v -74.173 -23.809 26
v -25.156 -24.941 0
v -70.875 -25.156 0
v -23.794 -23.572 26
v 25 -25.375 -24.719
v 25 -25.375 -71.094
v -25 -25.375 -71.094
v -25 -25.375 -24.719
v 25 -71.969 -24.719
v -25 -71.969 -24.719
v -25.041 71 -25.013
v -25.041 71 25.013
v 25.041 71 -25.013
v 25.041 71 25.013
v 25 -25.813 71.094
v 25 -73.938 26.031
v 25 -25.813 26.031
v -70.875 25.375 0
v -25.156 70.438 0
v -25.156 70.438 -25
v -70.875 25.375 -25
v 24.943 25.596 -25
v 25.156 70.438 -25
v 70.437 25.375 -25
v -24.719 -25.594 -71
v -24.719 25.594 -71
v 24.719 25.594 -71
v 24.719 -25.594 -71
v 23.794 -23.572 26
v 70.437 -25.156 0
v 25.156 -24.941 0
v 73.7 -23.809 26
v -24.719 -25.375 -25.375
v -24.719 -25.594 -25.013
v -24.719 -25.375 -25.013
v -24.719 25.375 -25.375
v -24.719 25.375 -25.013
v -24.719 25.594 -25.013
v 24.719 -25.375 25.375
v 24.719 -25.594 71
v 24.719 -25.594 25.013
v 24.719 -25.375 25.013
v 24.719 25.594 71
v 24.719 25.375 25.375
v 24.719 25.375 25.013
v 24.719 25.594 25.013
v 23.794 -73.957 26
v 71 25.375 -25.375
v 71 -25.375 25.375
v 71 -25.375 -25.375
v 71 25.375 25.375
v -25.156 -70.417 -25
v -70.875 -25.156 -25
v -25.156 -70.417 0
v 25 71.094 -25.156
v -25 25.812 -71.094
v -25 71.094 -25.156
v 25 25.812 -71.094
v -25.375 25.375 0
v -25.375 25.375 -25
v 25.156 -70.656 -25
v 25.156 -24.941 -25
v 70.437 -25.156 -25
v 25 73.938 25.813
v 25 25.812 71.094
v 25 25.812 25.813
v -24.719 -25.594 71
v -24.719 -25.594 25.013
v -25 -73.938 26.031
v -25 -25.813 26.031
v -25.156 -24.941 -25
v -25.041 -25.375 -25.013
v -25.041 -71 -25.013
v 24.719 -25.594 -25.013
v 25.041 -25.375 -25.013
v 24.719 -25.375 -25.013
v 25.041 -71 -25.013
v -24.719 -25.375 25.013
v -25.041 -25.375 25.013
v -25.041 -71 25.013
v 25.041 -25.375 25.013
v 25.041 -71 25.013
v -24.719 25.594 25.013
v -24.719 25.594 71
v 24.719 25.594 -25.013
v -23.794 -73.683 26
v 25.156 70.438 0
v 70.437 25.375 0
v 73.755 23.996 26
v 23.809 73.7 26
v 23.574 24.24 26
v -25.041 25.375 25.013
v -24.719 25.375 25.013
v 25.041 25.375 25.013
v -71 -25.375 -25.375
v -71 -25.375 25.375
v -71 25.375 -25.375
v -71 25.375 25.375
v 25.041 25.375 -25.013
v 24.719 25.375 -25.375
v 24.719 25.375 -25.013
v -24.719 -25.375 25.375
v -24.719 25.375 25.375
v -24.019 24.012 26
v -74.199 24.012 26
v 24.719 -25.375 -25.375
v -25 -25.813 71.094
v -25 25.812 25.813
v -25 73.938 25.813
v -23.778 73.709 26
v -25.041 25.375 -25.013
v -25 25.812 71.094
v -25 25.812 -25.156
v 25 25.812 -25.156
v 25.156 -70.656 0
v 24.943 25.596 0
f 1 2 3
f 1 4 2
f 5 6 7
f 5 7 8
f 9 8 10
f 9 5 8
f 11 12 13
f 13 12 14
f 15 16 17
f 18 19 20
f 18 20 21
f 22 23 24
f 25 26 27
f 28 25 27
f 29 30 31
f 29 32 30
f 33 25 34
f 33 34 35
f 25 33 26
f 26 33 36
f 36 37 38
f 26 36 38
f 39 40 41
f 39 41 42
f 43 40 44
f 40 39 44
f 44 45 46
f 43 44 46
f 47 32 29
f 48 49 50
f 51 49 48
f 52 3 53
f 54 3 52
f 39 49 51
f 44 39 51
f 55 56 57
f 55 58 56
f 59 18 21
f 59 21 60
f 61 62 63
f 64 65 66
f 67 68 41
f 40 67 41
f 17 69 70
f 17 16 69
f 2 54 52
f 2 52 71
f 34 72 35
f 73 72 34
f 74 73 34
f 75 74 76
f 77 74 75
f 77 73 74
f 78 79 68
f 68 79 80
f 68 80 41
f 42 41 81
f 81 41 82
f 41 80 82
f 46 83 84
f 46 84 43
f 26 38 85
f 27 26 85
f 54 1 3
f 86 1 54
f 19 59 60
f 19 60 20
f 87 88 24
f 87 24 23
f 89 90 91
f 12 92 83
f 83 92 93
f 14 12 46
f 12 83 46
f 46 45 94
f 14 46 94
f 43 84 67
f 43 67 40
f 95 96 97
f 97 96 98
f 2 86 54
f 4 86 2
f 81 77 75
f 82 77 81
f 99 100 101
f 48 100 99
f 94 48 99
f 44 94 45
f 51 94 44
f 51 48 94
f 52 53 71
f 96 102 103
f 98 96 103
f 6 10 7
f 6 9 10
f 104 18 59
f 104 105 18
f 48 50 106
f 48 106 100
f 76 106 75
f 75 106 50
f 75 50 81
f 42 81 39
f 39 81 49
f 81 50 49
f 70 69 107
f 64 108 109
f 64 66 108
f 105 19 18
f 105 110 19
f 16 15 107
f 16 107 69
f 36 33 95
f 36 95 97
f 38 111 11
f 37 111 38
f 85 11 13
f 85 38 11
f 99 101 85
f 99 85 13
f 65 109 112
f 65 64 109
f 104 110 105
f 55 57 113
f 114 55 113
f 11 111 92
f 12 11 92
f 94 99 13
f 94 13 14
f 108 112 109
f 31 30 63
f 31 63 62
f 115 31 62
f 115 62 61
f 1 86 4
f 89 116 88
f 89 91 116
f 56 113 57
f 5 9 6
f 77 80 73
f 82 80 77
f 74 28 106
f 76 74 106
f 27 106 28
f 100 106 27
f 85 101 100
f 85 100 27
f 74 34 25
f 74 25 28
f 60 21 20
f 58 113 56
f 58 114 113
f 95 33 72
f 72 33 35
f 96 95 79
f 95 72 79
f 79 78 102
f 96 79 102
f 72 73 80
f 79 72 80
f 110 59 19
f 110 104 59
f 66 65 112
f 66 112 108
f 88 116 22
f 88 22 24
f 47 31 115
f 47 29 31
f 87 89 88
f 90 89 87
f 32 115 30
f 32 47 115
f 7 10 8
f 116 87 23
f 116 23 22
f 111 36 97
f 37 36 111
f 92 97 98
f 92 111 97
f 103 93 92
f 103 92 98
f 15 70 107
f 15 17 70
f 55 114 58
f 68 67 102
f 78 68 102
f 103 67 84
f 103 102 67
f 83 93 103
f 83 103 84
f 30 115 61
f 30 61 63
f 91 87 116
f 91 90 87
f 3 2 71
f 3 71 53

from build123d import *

# Parameters (mm, degrees)
F0_W          = 50.0817559659
F0_H          = 50.0253587961
F2_DEPTH      = 71
F2_DEPTH_BACK = 71
F1_W          = 50.750002265
F1_H          = 50.750002265
F3_DEPTH      = 71
F3_DEPTH_BACK = 71
F4_W          = 49.4375005364
F4_H          = 51.1875003576
F5_DEPTH      = 71
F5_DEPTH_BACK = 71
F7_DEPTH      = 26
F7_TAPER      = -3
F7_DEPTH_BACK = 25
F9_DEPTH      = 25
F9_DEPTH_BACK = 25


with BuildPart() as f2:
    # F0 (on Front) → F2 (new body, two sides)
    with BuildSketch(Plane.XZ) as f2_sk:
        Rectangle(F0_W, F0_H)
    extrude(amount=F2_DEPTH)
    extrude(f2_sk.sketch, amount=-F2_DEPTH_BACK)

    # F1 (on Right) → F3 (join, two sides)
    with BuildSketch(Plane.YZ) as f3_sk:
        Rectangle(F1_W, F1_H)
    extrude(amount=F3_DEPTH)
    extrude(f3_sk.sketch, amount=-F3_DEPTH_BACK)

    # F4 (on Top) → F5 (join, two sides)
    with BuildSketch(Plane.XY) as f5_sk:
        Rectangle(F4_W, F4_H)
    extrude(amount=F5_DEPTH)
    extrude(f5_sk.sketch, amount=-F5_DEPTH_BACK)


with BuildPart() as f7:
    # F6 (on Top) → F7 (new body, two sides)
    with BuildSketch(Plane.XY) as f7_sk:
        Polygon((-25.3750011325, 25.3750011325), (-25.1562502235, 70.4375058413), (-70.8750039339, 25.3750011325), align=None)
    extrude(amount=F7_DEPTH, taper=F7_TAPER)
    extrude(f7_sk.sketch, amount=-F7_DEPTH_BACK)


with BuildPart() as f7b:
    # F6 (on Top) → F7, piece 2 (new body, two sides)
    with BuildSketch(Plane.XY) as f7_2_sk:
        Polygon((24.9428189903, 25.5958499854), (70.4374983907, 25.3750011325), (25.1562520862, 70.4375058413), align=None)
    extrude(amount=F7_DEPTH, taper=F7_TAPER)
    extrude(f7_2_sk.sketch, amount=-F7_DEPTH_BACK)


with BuildPart() as f7c:
    # F6 (on Top) → F7, piece 3 (new body, two sides)
    with BuildSketch(Plane.XY) as f7_3_sk:
        Polygon((25.1562520862, -24.940726669), (25.1562520862, -70.6562548876), (70.4374983907, -25.1562520862), align=None)
    extrude(amount=F7_DEPTH, taper=F7_TAPER)
    extrude(f7_3_sk.sketch, amount=-F7_DEPTH_BACK)


with BuildPart() as f7d:
    # F6 (on Top) → F7, piece 4 (new body, two sides)
    with BuildSketch(Plane.XY) as f7_4_sk:
        Polygon((-25.1562502235, -24.940726669), (-70.8750039339, -25.1562520862), (-25.1562502235, -70.4167821713), align=None)
    extrude(amount=F7_DEPTH, taper=F7_TAPER)
    extrude(f7_4_sk.sketch, amount=-F7_DEPTH_BACK)


with BuildPart() as f9:
    # F8 (on Right) → F9 (new body, two sides)
    with BuildSketch(Plane.YZ) as f9_sk:
        Polygon((-25.8125010878, 26.0312519968), (-25.8125010878, 71.0937529802), (-73.9375054836, 26.0312519968), align=None)
    extrude(amount=F9_DEPTH)
    extrude(f9_sk.sketch, amount=-F9_DEPTH_BACK)


with BuildPart() as f9b:
    # F8 (on Right) → F9, piece 2 (new body, two sides)
    with BuildSketch(Plane.YZ) as f9_2_sk:
        Polygon((73.9375054836, 25.8125010878), (25.8124992251, 71.0937529802), (25.8124992251, 25.8125010878), align=None)
    extrude(amount=F9_DEPTH)
    extrude(f9_2_sk.sketch, amount=-F9_DEPTH_BACK)


with BuildPart() as f9c:
    # F8 (on Right) → F9, piece 3 (new body, two sides)
    with BuildSketch(Plane.YZ) as f9_3_sk:
        Polygon((-71.9687566161, -24.7187502682), (-25.3750011325, -71.0937529802), (-25.3750011325, -24.7187502682), align=None)
    extrude(amount=F9_DEPTH)
    extrude(f9_3_sk.sketch, amount=-F9_DEPTH_BACK)


with BuildPart() as f9d:
    # F8 (on Right) → F9, piece 4 (new body, two sides)
    with BuildSketch(Plane.YZ) as f9_4_sk:
        Polygon((25.8124992251, -71.0937529802), (71.0937529802, -25.1562520862), (25.8124992251, -25.1562520862), align=None)
    extrude(amount=F9_DEPTH)
    extrude(f9_4_sk.sketch, amount=-F9_DEPTH_BACK)


solid = Compound([f2.part, f7.part, f7b.part, f7c.part, f7d.part, f9.part, f9b.part, f9c.part, f9d.part])
